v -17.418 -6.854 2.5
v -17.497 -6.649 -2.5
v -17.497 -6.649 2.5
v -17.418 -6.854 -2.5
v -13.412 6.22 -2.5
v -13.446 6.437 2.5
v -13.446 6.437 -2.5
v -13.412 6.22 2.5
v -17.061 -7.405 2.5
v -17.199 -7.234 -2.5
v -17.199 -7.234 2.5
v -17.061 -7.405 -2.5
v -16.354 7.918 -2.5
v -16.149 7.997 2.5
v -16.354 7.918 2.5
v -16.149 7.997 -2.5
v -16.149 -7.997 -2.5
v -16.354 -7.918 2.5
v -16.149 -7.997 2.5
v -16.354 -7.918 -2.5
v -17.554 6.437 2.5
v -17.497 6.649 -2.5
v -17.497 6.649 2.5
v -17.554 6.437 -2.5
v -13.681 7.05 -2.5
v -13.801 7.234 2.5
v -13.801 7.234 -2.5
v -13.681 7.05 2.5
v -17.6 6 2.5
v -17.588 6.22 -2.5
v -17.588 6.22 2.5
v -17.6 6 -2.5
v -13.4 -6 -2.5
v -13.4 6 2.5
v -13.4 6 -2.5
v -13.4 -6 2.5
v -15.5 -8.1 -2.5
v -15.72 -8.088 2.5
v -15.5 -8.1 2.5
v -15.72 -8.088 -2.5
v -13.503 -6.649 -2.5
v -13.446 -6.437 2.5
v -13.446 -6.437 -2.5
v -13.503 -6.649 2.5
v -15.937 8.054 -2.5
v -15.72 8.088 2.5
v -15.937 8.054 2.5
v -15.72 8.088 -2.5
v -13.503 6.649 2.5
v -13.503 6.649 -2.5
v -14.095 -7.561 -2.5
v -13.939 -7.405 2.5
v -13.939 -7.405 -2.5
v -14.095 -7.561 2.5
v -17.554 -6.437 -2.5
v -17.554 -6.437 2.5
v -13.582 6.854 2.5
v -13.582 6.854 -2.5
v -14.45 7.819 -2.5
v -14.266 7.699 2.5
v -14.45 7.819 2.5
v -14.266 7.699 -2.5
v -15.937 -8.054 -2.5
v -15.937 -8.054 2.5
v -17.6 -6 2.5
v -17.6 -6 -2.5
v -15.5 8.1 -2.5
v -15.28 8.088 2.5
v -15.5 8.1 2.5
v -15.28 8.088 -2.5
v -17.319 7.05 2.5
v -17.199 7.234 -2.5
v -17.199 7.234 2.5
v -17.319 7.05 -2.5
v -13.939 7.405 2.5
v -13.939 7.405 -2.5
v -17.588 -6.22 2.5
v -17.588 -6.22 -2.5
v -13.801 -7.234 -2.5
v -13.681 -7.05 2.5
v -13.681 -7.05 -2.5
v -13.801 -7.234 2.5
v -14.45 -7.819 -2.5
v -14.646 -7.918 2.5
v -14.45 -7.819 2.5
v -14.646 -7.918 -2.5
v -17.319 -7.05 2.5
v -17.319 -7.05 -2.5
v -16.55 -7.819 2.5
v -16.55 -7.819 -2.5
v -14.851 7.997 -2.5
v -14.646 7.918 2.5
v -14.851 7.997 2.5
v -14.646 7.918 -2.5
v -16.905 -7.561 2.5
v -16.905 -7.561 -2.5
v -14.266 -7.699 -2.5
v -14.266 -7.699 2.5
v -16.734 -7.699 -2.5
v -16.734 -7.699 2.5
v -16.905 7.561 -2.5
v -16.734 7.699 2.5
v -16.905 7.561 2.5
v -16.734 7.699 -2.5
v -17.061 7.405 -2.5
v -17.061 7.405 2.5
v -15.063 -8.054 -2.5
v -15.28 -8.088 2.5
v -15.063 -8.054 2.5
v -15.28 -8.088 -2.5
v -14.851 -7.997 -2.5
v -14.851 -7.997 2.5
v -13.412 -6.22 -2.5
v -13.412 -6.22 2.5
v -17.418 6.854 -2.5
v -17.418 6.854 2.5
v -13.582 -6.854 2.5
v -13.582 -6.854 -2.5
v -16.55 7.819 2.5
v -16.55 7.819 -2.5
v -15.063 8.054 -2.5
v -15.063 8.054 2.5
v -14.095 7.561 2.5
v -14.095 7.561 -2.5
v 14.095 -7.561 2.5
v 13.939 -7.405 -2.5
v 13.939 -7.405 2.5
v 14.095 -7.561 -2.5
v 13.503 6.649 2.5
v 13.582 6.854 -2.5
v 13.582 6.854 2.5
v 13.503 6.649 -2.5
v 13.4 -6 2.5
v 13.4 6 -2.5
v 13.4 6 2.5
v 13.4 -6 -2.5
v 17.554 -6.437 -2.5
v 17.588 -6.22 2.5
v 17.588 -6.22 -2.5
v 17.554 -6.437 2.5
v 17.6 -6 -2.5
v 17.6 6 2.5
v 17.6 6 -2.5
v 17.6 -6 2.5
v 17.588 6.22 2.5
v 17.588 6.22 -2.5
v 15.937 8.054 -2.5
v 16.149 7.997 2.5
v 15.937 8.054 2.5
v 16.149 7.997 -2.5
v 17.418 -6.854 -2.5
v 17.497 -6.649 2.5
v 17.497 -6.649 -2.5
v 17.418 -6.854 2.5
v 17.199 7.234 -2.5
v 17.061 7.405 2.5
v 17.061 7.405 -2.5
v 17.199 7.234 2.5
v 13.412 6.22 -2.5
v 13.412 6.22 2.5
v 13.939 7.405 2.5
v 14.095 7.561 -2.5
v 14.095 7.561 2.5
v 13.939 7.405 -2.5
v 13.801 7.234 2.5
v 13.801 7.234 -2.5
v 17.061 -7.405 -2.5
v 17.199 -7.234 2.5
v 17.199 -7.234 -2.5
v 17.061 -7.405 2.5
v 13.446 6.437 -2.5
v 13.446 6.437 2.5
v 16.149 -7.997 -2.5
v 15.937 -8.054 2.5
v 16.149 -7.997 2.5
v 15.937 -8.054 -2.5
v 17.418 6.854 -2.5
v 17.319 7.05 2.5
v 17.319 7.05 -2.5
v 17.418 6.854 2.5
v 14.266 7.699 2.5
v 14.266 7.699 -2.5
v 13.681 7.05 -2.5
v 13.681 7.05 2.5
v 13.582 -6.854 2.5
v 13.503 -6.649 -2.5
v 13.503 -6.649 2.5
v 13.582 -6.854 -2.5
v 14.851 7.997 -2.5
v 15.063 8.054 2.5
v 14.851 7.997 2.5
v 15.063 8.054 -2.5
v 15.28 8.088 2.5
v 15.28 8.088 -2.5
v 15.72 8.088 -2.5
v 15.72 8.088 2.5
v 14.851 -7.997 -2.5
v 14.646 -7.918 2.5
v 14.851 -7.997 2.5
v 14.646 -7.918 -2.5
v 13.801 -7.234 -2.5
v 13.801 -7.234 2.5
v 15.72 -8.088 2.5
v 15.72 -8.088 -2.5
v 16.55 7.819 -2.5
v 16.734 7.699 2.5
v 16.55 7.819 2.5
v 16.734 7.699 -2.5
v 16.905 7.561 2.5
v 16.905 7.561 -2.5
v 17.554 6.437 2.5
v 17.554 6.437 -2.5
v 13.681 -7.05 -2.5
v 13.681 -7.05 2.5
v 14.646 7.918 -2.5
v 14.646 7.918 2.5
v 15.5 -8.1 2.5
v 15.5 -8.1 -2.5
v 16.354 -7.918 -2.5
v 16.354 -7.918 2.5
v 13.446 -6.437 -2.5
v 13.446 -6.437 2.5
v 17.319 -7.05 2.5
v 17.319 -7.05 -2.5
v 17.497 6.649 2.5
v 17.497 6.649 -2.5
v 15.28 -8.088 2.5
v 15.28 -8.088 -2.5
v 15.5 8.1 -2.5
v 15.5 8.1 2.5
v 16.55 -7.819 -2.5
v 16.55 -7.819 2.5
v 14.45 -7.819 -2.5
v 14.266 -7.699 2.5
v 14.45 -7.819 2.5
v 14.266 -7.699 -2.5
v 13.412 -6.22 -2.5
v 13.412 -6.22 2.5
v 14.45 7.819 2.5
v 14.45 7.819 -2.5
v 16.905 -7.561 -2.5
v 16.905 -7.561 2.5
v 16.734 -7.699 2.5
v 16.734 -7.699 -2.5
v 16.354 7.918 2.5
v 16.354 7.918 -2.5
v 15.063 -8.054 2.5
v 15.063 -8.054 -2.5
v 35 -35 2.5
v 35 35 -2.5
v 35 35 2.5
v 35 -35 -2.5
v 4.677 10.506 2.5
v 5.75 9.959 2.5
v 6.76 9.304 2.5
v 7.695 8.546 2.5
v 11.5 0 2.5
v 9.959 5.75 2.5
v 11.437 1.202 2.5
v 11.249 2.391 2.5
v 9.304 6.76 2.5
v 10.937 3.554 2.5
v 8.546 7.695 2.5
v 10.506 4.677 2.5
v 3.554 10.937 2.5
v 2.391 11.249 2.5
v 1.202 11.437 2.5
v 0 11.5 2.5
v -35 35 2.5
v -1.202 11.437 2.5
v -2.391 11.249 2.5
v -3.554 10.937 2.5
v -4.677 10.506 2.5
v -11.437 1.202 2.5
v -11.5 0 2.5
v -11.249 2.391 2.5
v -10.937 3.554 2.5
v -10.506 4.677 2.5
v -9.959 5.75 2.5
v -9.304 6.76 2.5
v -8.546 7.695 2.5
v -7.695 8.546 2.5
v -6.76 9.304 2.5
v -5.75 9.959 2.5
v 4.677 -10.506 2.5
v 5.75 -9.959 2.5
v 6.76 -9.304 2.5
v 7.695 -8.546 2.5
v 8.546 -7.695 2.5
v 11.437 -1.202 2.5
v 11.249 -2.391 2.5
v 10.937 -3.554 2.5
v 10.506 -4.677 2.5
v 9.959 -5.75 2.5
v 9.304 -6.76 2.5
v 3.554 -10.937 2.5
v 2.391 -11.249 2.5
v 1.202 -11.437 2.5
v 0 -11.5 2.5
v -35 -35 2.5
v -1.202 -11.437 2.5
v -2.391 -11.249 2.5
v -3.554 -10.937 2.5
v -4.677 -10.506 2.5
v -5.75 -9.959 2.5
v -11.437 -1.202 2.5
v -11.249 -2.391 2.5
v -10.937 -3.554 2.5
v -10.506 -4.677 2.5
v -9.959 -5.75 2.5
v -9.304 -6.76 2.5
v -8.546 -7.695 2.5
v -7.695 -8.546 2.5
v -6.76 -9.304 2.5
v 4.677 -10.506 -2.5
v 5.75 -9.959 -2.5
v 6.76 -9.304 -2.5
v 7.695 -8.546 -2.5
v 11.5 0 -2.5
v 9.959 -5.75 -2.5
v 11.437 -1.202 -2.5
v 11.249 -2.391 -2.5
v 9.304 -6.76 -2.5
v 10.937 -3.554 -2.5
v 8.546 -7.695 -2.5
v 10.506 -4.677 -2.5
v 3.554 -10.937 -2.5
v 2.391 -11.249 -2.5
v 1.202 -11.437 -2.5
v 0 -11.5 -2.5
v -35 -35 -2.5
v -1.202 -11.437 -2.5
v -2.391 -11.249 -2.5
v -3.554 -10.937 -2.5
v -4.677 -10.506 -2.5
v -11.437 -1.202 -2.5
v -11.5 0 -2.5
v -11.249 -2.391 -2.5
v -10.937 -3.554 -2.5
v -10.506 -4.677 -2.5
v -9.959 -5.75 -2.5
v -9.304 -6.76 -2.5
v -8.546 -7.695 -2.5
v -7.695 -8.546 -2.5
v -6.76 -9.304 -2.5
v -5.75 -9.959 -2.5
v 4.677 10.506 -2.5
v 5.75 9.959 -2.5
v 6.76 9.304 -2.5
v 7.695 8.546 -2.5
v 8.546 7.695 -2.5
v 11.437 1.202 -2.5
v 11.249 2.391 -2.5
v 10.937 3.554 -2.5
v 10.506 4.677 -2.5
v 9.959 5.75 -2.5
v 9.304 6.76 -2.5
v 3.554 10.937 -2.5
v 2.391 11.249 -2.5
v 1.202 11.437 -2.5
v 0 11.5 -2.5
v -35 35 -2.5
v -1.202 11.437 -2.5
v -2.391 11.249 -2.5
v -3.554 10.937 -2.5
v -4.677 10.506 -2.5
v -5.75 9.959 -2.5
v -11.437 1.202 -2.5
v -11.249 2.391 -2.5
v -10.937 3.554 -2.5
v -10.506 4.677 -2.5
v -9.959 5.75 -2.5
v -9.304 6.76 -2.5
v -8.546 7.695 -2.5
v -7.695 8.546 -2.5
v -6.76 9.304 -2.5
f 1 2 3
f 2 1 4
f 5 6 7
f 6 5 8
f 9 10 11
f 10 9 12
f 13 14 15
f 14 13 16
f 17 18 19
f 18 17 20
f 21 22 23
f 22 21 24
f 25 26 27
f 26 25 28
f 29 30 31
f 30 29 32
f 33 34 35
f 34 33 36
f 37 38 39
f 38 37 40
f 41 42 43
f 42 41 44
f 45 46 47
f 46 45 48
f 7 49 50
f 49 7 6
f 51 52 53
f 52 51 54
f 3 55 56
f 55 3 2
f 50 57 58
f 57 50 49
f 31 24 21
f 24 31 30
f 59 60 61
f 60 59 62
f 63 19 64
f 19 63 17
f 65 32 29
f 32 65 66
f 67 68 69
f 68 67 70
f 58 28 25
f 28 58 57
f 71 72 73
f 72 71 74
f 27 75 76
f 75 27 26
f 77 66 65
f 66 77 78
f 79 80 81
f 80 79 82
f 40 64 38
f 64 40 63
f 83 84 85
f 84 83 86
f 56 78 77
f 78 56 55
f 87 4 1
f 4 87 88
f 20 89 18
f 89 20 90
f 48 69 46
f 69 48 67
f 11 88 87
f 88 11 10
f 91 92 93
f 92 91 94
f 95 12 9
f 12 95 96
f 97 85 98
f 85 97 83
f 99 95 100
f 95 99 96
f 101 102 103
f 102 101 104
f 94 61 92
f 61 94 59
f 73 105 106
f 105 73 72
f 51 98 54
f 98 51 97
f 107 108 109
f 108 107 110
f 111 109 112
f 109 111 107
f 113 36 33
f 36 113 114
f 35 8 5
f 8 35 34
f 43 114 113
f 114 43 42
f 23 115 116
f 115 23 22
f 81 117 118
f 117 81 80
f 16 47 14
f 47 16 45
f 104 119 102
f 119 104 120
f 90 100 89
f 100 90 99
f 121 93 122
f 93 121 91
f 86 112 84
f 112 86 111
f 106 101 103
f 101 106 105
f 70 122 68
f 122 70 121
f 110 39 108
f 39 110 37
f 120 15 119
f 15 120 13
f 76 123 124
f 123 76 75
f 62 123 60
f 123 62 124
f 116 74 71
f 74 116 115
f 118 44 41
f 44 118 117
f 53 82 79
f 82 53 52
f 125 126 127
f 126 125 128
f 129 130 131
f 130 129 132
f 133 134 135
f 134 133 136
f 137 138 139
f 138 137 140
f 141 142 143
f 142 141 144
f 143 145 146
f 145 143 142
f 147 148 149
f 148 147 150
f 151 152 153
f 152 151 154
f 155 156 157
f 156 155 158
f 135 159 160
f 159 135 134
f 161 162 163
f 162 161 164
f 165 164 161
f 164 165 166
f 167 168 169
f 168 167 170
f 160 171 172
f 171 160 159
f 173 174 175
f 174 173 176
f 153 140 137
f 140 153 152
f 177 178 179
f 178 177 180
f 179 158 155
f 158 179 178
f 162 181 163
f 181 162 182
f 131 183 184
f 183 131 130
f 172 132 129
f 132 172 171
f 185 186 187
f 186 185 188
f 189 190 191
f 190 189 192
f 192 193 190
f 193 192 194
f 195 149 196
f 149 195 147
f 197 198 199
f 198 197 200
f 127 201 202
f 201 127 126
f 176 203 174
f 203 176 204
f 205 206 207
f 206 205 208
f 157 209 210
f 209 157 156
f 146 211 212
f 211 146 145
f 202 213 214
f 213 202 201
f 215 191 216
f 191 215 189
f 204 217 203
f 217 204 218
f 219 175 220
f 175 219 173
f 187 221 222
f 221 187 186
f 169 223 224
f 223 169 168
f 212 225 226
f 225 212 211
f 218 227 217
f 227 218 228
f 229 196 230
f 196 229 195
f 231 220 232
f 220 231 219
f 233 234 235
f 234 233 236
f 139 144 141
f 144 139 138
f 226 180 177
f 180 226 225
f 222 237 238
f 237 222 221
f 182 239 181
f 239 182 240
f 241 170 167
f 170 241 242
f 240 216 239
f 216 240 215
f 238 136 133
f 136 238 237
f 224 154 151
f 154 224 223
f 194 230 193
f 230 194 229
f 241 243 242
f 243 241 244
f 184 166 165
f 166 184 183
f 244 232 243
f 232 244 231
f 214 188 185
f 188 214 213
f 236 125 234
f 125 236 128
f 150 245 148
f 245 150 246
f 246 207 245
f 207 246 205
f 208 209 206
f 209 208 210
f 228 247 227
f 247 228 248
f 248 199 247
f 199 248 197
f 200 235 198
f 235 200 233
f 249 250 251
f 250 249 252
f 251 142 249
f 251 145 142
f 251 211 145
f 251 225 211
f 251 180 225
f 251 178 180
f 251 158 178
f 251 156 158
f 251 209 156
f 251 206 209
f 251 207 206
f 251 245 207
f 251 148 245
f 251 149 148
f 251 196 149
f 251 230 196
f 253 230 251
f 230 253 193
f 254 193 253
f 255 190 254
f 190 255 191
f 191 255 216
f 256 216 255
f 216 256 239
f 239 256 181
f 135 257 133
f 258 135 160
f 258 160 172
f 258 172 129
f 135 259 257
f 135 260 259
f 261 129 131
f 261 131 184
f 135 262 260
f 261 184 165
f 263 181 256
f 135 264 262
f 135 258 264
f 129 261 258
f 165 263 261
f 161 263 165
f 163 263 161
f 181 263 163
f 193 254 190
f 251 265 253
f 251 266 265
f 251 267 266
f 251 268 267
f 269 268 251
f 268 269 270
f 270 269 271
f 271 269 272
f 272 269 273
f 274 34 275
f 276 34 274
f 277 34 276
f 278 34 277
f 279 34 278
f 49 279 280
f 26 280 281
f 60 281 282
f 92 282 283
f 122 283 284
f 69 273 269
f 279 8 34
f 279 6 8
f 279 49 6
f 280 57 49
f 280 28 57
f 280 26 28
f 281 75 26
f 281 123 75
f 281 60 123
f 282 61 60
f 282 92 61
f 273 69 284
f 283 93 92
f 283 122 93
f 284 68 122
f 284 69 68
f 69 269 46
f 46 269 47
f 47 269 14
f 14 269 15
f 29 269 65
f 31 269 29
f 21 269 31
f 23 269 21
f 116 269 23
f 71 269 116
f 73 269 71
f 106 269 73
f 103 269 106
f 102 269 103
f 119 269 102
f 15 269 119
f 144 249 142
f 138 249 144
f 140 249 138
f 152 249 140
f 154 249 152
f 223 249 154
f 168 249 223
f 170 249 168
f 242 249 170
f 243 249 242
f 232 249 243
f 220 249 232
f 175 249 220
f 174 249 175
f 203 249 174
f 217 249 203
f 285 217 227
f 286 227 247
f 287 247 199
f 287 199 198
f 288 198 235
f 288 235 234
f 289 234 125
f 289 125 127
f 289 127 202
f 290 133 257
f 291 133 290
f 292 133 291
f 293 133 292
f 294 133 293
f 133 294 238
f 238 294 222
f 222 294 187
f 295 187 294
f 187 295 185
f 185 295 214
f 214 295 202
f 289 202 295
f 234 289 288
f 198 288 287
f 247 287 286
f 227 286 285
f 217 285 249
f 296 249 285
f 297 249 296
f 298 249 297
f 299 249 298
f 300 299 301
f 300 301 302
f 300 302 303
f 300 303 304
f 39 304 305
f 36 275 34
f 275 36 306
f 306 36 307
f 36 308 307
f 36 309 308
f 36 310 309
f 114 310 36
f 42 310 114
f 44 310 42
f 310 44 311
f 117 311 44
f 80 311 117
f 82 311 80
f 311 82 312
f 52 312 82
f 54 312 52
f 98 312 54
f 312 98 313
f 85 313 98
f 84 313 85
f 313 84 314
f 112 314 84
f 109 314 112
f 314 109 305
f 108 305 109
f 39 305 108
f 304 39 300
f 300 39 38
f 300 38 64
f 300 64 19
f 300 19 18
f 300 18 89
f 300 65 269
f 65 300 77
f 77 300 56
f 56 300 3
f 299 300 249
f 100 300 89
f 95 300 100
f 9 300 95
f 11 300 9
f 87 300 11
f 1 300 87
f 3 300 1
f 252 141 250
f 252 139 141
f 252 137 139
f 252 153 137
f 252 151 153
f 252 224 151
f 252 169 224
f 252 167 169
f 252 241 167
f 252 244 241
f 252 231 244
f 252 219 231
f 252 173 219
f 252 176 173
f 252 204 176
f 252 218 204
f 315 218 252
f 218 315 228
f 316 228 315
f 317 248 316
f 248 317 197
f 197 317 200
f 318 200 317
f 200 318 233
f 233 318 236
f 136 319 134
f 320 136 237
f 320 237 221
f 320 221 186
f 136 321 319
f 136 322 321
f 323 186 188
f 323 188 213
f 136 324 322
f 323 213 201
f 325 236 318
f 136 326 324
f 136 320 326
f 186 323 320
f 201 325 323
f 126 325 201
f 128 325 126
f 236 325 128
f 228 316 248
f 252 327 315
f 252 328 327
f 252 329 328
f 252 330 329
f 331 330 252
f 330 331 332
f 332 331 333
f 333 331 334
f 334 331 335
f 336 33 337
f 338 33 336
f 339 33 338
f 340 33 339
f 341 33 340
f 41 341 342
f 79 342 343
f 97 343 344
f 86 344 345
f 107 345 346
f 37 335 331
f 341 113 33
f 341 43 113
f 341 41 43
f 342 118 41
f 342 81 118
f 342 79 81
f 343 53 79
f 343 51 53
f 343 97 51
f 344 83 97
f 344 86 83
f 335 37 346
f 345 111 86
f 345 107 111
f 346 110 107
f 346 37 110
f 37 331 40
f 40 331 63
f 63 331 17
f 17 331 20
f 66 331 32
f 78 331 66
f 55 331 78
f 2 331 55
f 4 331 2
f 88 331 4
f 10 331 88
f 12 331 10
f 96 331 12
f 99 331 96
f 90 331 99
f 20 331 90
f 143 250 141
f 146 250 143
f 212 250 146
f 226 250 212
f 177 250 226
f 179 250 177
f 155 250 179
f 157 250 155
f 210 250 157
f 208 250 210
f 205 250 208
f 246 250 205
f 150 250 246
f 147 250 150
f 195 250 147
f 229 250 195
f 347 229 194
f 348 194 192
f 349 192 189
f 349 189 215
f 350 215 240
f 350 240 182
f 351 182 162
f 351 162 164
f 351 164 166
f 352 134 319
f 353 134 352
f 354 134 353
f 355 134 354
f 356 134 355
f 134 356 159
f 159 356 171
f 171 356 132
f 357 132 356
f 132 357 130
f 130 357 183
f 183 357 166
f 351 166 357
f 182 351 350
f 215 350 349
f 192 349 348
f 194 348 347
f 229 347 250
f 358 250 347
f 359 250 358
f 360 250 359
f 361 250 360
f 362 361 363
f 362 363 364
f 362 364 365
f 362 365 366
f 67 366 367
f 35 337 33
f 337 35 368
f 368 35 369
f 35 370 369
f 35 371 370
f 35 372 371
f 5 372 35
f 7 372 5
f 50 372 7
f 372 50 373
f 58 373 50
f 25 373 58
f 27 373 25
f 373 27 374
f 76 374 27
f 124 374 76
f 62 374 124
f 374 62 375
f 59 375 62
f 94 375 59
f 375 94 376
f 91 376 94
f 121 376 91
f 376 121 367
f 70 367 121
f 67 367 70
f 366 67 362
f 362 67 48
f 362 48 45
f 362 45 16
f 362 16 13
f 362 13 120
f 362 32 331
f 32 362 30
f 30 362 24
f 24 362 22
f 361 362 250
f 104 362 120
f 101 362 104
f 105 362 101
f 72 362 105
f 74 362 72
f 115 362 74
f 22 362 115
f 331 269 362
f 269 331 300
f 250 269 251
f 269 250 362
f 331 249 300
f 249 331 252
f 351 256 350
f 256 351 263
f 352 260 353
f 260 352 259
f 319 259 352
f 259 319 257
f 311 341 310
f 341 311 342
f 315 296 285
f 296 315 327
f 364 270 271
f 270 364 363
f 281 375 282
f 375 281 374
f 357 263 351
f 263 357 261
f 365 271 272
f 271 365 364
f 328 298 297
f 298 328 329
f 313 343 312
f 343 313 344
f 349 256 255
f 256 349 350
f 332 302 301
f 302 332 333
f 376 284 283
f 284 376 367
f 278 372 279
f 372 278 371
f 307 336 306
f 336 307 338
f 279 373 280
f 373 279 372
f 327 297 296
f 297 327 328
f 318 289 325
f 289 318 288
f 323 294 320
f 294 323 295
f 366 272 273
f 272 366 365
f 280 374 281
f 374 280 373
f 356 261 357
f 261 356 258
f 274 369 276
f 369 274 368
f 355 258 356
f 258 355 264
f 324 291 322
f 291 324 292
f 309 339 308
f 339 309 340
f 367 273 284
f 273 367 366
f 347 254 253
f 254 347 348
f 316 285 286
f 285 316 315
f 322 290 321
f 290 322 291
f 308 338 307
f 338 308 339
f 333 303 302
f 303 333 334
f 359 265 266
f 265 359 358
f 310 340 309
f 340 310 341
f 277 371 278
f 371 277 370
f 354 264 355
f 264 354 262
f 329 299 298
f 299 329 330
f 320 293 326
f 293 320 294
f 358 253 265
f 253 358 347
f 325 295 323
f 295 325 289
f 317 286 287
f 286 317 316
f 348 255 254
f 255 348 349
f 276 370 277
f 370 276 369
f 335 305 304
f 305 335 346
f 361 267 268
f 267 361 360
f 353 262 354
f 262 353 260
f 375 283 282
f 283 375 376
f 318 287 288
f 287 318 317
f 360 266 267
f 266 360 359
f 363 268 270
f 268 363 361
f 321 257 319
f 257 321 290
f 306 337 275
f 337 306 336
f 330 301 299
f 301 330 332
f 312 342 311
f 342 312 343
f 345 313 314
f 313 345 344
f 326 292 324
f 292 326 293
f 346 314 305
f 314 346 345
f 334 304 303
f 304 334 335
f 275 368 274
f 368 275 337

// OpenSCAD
// NEMA 17 slotted face plate
// Slotted NEMA 17 face plate; all through cuts extend by eps.
$fn = 60;
eps = 0.02;
plate_w = 70;
plate_h = 70;
plate_t = 5;
nema_pitch = 31;
center_clearance_d = 23;
mount_d = 3.6;
slot_length = 12;
slot_d = 4.2;

module vertical_slot(x, y) {
    hull() {
        translate([x, y - slot_length / 2, -plate_t / 2 - eps])
            cylinder(d = slot_d, h = plate_t + 2 * eps);
        translate([x, y + slot_length / 2, -plate_t / 2 - eps])
            cylinder(d = slot_d, h = plate_t + 2 * eps);
    }
}

difference() {
    cube([plate_w, plate_h, plate_t], center = true);
    translate([0, 0, -plate_t / 2 - eps])
        cylinder(d = center_clearance_d, h = plate_t + 2 * eps);
    for (x = [-nema_pitch / 2, nema_pitch / 2])
        vertical_slot(x, 0);
}
